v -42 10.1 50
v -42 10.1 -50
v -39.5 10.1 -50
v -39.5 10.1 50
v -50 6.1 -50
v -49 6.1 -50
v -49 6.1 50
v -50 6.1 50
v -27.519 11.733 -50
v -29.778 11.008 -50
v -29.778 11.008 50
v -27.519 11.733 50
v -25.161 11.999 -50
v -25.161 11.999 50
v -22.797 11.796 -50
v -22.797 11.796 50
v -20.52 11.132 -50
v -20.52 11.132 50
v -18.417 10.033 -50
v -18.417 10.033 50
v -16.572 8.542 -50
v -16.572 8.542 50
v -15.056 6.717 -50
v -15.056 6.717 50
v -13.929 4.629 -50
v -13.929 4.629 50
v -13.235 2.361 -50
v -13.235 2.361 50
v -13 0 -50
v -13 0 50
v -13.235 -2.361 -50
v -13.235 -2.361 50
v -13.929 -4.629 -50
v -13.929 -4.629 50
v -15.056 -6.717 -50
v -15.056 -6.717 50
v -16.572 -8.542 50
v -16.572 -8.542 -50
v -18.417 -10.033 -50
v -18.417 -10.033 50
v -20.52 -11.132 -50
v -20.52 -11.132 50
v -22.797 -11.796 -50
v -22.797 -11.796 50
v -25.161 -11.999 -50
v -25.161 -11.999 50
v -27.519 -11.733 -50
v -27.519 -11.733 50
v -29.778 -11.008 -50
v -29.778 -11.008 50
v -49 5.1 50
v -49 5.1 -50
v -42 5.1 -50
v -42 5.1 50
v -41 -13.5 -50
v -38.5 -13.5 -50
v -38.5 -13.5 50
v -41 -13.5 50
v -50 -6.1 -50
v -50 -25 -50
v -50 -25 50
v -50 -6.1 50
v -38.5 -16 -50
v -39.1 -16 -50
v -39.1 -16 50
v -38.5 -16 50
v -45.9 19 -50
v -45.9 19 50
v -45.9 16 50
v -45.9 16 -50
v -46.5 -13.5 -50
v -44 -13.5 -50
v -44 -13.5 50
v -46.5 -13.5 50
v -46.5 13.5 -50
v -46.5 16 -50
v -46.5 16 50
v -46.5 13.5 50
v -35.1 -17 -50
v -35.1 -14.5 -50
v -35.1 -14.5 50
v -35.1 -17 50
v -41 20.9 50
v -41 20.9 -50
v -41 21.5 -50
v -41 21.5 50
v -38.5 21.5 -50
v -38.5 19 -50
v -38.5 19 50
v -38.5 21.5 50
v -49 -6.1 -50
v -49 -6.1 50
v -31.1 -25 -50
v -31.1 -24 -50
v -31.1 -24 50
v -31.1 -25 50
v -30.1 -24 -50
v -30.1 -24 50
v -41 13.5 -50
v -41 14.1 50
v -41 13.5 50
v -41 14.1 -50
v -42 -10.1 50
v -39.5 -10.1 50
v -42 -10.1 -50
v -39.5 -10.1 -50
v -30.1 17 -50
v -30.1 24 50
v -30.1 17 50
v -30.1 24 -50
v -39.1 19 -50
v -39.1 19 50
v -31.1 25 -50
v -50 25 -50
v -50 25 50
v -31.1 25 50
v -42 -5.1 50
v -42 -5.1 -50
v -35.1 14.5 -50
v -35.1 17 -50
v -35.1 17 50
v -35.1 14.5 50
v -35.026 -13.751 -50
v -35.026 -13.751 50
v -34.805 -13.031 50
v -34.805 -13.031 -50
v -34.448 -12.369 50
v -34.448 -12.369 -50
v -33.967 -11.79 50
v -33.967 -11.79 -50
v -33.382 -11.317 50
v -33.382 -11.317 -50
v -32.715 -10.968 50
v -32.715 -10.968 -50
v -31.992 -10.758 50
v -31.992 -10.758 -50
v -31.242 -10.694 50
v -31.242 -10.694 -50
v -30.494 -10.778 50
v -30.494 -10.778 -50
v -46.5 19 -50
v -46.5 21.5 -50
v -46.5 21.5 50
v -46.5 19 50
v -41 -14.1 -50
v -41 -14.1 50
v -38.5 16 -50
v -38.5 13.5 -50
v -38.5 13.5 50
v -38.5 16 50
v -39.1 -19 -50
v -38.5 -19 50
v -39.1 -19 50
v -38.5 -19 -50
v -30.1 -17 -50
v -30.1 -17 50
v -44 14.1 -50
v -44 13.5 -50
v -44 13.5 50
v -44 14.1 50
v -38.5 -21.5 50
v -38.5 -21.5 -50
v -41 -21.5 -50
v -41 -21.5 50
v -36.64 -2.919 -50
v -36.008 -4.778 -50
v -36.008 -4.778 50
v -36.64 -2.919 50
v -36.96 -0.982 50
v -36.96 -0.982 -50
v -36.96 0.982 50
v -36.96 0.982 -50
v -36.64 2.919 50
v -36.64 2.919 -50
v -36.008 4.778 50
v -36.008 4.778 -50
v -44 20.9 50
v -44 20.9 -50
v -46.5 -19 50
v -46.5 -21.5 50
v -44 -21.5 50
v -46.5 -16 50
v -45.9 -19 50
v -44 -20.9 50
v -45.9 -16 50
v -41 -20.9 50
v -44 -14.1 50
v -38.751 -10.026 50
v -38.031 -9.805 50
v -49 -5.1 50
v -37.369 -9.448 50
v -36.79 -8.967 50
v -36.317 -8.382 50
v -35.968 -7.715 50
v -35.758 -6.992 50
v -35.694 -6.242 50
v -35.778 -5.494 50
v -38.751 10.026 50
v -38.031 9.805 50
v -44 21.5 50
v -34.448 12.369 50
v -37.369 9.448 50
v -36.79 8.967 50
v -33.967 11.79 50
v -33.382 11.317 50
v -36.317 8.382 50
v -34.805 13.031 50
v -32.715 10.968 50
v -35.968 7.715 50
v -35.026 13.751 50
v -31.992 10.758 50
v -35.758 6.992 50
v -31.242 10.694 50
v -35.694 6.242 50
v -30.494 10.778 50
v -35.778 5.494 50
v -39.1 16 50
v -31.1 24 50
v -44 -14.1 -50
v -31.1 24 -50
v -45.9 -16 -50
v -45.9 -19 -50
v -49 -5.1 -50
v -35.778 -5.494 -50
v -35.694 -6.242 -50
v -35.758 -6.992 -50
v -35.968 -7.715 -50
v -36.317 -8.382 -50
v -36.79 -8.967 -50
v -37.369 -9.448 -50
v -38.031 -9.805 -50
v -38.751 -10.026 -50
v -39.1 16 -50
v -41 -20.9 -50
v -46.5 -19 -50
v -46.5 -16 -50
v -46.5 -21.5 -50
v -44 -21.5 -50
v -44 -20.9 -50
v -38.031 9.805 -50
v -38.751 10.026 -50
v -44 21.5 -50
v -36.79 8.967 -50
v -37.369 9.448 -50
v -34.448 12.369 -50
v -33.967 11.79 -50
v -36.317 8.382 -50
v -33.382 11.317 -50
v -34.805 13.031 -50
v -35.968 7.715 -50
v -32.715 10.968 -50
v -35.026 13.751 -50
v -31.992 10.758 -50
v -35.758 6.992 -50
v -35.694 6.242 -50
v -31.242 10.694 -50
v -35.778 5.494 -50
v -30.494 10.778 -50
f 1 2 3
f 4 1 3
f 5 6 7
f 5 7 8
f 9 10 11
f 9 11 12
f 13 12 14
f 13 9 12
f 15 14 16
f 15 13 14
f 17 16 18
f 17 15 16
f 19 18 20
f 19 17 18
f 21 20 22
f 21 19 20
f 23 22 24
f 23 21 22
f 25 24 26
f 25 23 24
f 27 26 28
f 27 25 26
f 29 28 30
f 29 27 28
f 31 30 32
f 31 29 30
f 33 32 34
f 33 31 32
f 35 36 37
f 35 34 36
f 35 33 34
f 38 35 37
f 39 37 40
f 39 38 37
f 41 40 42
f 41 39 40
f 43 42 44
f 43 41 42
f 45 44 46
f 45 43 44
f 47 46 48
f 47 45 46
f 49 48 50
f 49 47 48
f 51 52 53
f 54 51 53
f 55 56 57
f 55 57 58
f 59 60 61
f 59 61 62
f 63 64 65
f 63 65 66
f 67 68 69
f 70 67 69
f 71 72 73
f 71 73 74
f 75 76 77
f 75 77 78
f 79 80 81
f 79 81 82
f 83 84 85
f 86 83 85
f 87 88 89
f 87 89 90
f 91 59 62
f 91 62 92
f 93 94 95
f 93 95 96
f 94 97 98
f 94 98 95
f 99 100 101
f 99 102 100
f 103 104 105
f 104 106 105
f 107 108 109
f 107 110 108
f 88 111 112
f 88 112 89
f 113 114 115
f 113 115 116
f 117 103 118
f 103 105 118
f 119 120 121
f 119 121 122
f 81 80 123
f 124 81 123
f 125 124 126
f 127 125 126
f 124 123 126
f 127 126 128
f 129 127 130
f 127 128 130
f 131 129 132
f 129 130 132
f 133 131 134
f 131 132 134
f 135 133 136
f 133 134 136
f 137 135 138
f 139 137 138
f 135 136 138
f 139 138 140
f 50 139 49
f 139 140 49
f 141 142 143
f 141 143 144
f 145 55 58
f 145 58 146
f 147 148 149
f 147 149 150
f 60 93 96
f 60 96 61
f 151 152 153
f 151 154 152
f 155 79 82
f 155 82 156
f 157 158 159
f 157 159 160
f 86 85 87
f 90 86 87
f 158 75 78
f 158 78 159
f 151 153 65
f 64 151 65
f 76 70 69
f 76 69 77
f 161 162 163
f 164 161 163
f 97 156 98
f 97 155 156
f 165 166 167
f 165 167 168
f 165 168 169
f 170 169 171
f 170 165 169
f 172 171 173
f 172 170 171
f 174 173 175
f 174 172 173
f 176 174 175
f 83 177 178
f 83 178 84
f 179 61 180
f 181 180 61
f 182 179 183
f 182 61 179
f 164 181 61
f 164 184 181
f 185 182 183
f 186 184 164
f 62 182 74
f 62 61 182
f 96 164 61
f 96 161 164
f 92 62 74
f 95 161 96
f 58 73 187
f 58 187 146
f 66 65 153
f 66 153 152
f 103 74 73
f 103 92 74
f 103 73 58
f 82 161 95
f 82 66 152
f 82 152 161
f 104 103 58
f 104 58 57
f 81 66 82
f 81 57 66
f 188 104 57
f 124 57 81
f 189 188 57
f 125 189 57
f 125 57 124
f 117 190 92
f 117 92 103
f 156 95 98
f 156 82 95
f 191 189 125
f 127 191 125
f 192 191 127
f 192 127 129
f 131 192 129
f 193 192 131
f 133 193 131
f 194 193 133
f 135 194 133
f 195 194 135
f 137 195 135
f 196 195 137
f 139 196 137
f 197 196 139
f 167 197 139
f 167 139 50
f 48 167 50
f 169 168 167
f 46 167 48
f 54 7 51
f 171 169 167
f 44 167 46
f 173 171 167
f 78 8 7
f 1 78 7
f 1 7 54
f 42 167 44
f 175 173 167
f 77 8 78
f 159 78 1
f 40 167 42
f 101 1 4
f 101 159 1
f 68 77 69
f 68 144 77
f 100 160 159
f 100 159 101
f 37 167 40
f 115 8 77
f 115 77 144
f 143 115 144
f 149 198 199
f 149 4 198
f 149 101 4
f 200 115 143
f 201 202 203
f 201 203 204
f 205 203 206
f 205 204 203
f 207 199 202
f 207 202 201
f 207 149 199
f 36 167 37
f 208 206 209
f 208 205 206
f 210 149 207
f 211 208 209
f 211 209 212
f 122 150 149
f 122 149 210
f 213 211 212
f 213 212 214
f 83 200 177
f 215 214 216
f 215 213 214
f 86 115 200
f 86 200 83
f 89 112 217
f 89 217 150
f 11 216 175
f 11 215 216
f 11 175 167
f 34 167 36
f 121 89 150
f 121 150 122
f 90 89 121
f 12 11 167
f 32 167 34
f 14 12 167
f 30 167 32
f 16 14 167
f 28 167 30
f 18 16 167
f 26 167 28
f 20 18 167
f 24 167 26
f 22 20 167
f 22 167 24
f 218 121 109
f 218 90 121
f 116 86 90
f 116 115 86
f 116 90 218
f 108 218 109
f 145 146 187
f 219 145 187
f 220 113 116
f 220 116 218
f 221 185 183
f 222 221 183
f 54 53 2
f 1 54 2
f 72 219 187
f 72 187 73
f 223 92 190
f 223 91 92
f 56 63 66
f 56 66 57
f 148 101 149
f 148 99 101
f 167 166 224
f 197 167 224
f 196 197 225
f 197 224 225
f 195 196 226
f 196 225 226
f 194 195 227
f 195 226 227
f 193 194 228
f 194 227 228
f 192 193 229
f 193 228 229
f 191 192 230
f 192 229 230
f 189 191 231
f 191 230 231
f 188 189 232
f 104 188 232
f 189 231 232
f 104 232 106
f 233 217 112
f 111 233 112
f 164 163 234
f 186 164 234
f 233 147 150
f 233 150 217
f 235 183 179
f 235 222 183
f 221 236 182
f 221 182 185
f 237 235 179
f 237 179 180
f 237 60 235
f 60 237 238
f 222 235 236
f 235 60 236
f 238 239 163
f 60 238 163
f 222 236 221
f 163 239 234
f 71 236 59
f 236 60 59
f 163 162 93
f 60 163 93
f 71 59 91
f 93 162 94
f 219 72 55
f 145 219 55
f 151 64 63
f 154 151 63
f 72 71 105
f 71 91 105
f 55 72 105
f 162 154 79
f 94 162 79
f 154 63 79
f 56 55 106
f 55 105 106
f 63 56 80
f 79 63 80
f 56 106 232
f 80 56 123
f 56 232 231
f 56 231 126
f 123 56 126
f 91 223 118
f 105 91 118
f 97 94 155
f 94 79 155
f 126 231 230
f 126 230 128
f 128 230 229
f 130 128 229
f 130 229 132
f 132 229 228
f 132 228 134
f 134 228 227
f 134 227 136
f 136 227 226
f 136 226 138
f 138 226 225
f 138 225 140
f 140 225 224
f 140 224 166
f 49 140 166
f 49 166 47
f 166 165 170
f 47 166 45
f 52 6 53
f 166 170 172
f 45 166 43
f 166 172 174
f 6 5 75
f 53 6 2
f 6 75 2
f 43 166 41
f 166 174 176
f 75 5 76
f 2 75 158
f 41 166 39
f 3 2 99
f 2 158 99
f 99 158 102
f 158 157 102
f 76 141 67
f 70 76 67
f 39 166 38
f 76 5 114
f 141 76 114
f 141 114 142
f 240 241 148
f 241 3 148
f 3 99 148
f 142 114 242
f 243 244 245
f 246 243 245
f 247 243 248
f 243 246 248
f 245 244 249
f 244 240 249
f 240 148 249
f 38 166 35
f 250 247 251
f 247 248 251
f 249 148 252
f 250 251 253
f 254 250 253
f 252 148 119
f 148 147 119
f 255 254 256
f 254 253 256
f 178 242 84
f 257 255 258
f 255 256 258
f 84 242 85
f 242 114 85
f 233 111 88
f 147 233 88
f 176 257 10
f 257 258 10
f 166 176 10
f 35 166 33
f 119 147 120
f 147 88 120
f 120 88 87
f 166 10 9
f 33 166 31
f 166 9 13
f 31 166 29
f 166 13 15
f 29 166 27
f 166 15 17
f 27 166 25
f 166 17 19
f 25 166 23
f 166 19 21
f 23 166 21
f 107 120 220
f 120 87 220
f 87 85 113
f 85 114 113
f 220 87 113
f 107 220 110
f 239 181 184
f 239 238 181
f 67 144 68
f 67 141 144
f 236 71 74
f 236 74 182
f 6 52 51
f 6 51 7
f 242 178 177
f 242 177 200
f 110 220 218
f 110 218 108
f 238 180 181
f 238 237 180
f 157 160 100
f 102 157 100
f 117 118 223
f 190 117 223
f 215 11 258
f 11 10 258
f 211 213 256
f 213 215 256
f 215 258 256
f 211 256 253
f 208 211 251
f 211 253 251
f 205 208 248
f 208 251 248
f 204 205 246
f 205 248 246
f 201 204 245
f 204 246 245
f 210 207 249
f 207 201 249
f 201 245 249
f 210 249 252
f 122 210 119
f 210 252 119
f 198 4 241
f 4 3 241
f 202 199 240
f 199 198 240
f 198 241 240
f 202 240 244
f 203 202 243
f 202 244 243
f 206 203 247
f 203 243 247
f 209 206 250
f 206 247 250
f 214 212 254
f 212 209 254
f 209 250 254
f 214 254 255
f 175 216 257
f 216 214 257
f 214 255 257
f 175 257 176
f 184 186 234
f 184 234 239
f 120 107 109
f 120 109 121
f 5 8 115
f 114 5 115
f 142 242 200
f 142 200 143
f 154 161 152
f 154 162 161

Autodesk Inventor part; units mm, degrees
ref_plane "YZ Plane" through (0, 0, 0) normal (1, 0, 0) x (0, 1, 0)
ref_plane "XZ Plane" through (0, 0, 0) normal (0, 1, 0) x (-1, 0, 0)
ref_plane "XY Plane" through (0, 0, 0) normal (0, 0, 1) x (1, 0, 0)
sketch "Sketch1" plane through (0, 0, 0) normal (0, 0, 1) x (1, 0, 0)
  circle A0 centre (-25, 0) radius 6
  line L0 (0, 0) -> (-25, 0) construction
  circle A1 centre (-25, 0) radius 12
  line L1 (-45.9, 14.1) -> (-39.1, 14.1) construction
  line L2 (-39.1, 14.1) -> (-39.1, 20.9) construction
  line L3 (-39.1, 20.9) -> (-45.9, 20.9) construction
  line L4 (-45.9, 20.9) -> (-45.9, 14.1) construction
  line L5 (-45.9, 14.1) -> (-39.1, 20.9) construction
  line L6 (-39.1, 14.1) -> (-45.9, 20.9) construction
  line L7 (-46.5, 13.5) -> (-38.5, 13.5) construction
  line L8 (-38.5, 13.5) -> (-38.5, 21.5) construction
  line L9 (-38.5, 21.5) -> (-46.5, 21.5) construction
  line L10 (-46.5, 21.5) -> (-46.5, 13.5) construction
  line L11 (-46.5, 13.5) -> (-38.5, 21.5) construction
  line L12 (-38.5, 13.5) -> (-46.5, 21.5) construction
  line L13 (-44, 20.9) -> (-41, 20.9)
  line L14 (-44, 20.9) -> (-44, 21.5)
  line L15 (-44, 21.5) -> (-46.5, 21.5)
  line L16 (-41, 20.9) -> (-41, 21.5)
  line L17 (-41, 21.5) -> (-38.5, 21.5)
  line L18 (-46.5, 21.5) -> (-46.5, 19)
  line L19 (-46.5, 19) -> (-45.9, 19)
  line L20 (-45.9, 19) -> (-45.9, 16)
  line L21 (-45.9, 16) -> (-46.5, 16)
  line L22 (-46.5, 16) -> (-46.5, 13.5)
  line L23 (-46.5, 13.5) -> (-44, 13.5)
  line L24 (-44, 13.5) -> (-44, 14.1)
  line L25 (-44, 14.1) -> (-41, 14.1)
  line L26 (-41, 14.1) -> (-41, 13.5)
  line L27 (-41, 13.5) -> (-38.5, 13.5)
  line L28 (-38.5, 13.5) -> (-38.5, 16)
  line L29 (-38.5, 16) -> (-39.1, 16)
  line L30 (-39.1, 16) -> (-39.1, 19)
  line L31 (-39.1, 19) -> (-38.5, 19)
  line L32 (-38.5, 19) -> (-38.5, 21.5)
  line L33 (-50, 25) -> (-50, 5.1) construction
  line L34 (-50, 25) -> (-30.1, 25) construction
  line L35 (-50, 5.1) -> (-49, 5.1) construction
  line L36 (-49, 5.1) -> (-49, 6.1)
  line L37 (-49, 6.1) -> (-50, 6.1)
  line L38 (-50, 6.1) -> (-50, 5.1) construction
  line L39 (-50, 5.1) -> (-49, 6.1) construction
  line L40 (-49, 5.1) -> (-50, 6.1) construction
  line L41 (-50, 6.1) -> (-50, 25)
  line L42 (-31.1, 24) -> (-30.1, 24)
  line L43 (-30.1, 24) -> (-30.1, 25) construction
  line L44 (-30.1, 25) -> (-31.1, 25) construction
  line L45 (-31.1, 25) -> (-31.1, 24)
  line L46 (-31.1, 24) -> (-30.1, 25) construction
  line L47 (-30.1, 24) -> (-31.1, 25) construction
  line L48 (-50, 25) -> (-31.1, 25)
  line L49 (-30.1, 24) -> (-30.1, 17)
  line L50 (-30.1, 17) -> (-35.1, 17)
  line L51 (-35.1, 17) -> (-35.1, 12) construction
  line L52 (-35.1, 12) -> (-25, 12) construction
  arc A2 (-35.1, 14.5) -> (-29.7776, 11.0079) centre (-31.2932, 14.5) ccw
  line L53 (-35.1, 17) -> (-35.1, 14.5)
  line L54 (-49, 5.1) -> (-42, 5.1)
  line L55 (-42, 5.1) -> (-42, 10.1)
  line L56 (-42, 10.1) -> (-39.5, 10.1)
  arc A3 (-36.0079, 4.7776) -> (-39.5, 10.1) centre (-39.5, 6.2932) ccw
  arc A4 (-20.2224, 11.0079) -> (-14.9, 14.5) centre (-18.7068, 14.5) ccw
  line L57 (-14.9, 14.5) -> (-14.9, 17)
  line L58 (-14.9, 17) -> (-19.9, 17)
  line L59 (-19.9, 17) -> (-19.9, 24)
  line L60 (-19.9, 24) -> (-18.9, 24)
  line L61 (-18.9, 24) -> (-18.9, 25)
  line L62 (-18.9, 25) -> (-19.9, 25) construction
  line L63 (-19.9, 25) -> (-19.9, 24) construction
  line L64 (-19.9, 24) -> (-18.9, 25) construction
  line L65 (-18.9, 24) -> (-19.9, 25) construction
  line L66 (-18.9, 25) -> (0, 25)
  line L67 (0, 22) -> (-11.9, 22) construction
  line L68 (-11.9, 22) -> (-11.9, 14.5) construction
  line L69 (0, 22) -> (0, 25)
  arc A5 (-10.9, 22) -> (-11.9, 21) centre (-10.9, 21) ccw
  line L70 (-11.9, 21) -> (-11.9, 14.5)
  line L71 (-10.9, 22) -> (0, 22)
  arc A6 (-13.1902, 10.8149) -> (-13.9921, 4.7776) centre (-8.5727, 7.1297) ccw
  arc A7 (-13.1902, 10.8149) -> (-11.9, 14.5) centre (-17.8078, 14.5) ccw
  point P0 (-42.5, 17.5)
  point P1 (-42.5, 17.5)
  point P2 (-42.5, 17.5)
  point P3 (-42.5, 20.9)
  point P4 (-49.5, 5.6)
  point P5 (-30.6, 24.5)
  point P6 (-19.4, 24.5)
  dimension "d0" = 25
  dimension "d1" = 12
  dimension "d2" = 24
  dimension "d16" = 17.5
  dimension "d17" = 42.5
  dimension "d18" = 6.8
  dimension "d19" = 8
  dimension "d20" = 3
  dimension "d21" = 5.1
  dimension "d22" = 25
  dimension "d23" = 50
  dimension "d24" = 1
  dimension "d25" = 7
  dimension "d26" = 5
  dimension "d27" = 5
  dimension "d30" = 3
  dimension "d31" = 3
  dimension "d34" = 1
extrude "Extrusion1" add sketch "Sketch1" along normal mid plane 100 contours A1
sketch "Sketch2" plane through (-25, 0, 50) normal (0, 0, 1) x (1, 0, 0)
  circle A0 centre (0, 0) radius 6 construction
  line L0 (0, 0) -> (1.3656, 6.8655) construction
  circle A1 centre (0, 0) radius 7 construction
  line L1 (0, 0) -> (-1.3656, 6.8655) construction
  line L2 (0, 0) -> (0, 7) construction
  line L3 (0, 0) -> (-3.889, 5.8203) construction
  arc A2 (-1.1705, 5.8847) -> (-3.3334, 4.9888) centre (0, 0) ccw
  line L4 (-3.3334, 4.9888) -> (-3.889, 5.8203)
  line L5 (-1.1705, 5.8847) -> (-1.3656, 6.8655)
  arc A3 (-1.3656, 6.8655) -> (-3.889, 5.8203) centre (0, 0) ccw
  point P0 (25, 0)
  point P1 (-2.6788, 6.4672)
  dimension "d5" = 14
  dimension "d6" = 22.5
  dimension "d7" = 22.5
extrude "Extrusion2" cut sketch "Sketch2" against normal through all
pattern_circular "Circular Pattern2" count 8 over 360 about axis through (-25, 0, 0) along (0, 0, 1) of "Extrusion2"
extrude "Extrusion3" add sketch "Sketch1" along normal mid plane 100 contours A3 L56 L55 L54 L36 L37 L41 L48 L45 L42 L49 L50 L53 A2 A1
mirror "Mirror1" about plane through (0, 0, 0) normal (0, 1, 0) of "Extrusion3"
extrude "Extrusion4" add sketch "Sketch1" along normal mid plane 100 contours A0 | A1
equation "\"d31\" = d30"
equation "\"d7\" = d6"
properties part number "perfil-aluminio-0002-001"
